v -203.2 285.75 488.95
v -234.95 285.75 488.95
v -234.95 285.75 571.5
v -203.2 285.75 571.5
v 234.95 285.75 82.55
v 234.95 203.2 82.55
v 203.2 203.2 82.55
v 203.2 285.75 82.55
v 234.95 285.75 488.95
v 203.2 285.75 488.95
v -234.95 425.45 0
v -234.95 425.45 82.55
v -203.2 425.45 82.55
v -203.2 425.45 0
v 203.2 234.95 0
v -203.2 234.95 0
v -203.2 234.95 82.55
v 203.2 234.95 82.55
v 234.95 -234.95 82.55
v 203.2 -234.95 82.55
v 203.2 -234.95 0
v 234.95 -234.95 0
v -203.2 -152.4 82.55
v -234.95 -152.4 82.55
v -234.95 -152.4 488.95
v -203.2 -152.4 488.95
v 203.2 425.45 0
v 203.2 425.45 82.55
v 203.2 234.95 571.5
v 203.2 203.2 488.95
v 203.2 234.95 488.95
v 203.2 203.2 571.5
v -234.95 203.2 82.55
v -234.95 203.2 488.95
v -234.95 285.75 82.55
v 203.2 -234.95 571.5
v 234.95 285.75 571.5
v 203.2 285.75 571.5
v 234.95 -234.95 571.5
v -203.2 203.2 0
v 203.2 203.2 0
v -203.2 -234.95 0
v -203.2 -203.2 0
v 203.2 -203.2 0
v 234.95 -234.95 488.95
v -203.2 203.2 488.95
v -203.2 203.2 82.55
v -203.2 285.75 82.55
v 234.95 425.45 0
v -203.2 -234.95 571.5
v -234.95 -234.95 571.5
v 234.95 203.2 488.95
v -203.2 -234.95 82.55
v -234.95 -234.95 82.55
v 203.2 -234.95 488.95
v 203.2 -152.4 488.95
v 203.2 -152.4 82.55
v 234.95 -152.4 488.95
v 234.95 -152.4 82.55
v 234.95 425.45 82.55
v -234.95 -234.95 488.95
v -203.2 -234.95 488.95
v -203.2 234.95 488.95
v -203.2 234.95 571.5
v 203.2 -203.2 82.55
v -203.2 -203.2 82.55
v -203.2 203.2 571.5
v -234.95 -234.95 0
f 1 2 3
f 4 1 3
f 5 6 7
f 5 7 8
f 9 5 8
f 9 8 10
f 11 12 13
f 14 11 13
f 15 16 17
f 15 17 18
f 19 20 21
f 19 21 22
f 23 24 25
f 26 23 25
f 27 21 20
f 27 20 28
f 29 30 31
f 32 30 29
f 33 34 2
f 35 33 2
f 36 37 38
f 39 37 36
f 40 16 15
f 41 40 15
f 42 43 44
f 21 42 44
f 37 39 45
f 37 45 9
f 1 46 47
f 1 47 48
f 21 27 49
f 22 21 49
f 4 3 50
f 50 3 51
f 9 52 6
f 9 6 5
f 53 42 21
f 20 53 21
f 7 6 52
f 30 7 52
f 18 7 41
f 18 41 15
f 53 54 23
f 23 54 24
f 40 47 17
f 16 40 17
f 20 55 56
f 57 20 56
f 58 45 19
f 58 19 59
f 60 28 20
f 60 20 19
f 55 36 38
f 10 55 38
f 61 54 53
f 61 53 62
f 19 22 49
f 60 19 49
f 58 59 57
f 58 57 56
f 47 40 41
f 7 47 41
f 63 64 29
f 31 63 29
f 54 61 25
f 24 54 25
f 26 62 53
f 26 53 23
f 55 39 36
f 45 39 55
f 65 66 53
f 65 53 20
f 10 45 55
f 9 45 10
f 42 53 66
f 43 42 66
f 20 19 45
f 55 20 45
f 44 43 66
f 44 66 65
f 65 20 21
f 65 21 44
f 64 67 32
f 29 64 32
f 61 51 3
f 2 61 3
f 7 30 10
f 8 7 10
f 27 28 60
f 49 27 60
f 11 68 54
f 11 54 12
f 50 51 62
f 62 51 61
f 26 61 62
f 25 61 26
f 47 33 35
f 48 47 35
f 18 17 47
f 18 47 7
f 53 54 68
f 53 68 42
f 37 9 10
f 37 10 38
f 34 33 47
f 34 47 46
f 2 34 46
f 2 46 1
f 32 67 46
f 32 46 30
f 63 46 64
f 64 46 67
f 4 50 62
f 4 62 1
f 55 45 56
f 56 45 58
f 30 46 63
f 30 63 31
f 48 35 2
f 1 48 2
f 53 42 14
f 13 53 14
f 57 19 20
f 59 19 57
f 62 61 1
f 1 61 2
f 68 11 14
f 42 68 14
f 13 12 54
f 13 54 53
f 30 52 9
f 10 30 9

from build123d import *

# Parameters (mm, degrees)
F0_W      = 406.4
F0_H      = 31.75
F1_DEPTH  = 82.55
F2_W      = 31.75
F2_H      = 660.4
F3_DEPTH  = 82.55
F4_W      = 82.55
F4_H      = 406.4
F5_DEPTH  = 31.75
F7_DEPTH  = 31.75
F9_W      = 406.4
F9_H      = 82.55
F10_DEPTH = 31.75


with BuildPart() as f1:
    # F0 (on Top) → F1 (new body)
    with BuildSketch(Plane.XY):
        with Locations((0, 219.075)):
            Rectangle(F0_W, F0_H)
        with Locations((0, -219.075)):
            Rectangle(F0_W, F0_H)
    extrude(amount=F1_DEPTH)


with BuildPart() as f3:
    # F2 (on Top) → F3 (new body)
    with BuildSketch(Plane.XY):
        with Locations((-219.075, 95.25)):
            Rectangle(F2_W, F2_H)
        with Locations((219.075, 95.25)):
            Rectangle(F2_W, F2_H)
    extrude(amount=F3_DEPTH)


with BuildPart() as f5:
    # F4 (on face) → F5 (new body)
    with BuildSketch(Plane.YZ.offset(234.95)):
        with Locations((-193.675, 285.75)):
            Rectangle(F4_W, F4_H)
        with Locations((244.475, 285.75)):
            Rectangle(F4_W, F4_H)
    extrude(amount=-F5_DEPTH)


with BuildPart() as f7:
    # F6 (on face) → F7 (new body)
    with BuildSketch(Plane.YZ.offset(234.95)):
        Polygon((-234.95, 571.5), (-234.95, 488.95), (-152.4, 488.95), (285.75, 488.95), (285.75, 571.5), align=None)
    extrude(amount=-F7_DEPTH)


with BuildPart() as f8_1:
    # F8: instance of F5
    add(f5.part.mirror(Plane.YZ))


with BuildPart() as f8_2:
    # F8: instance of F7
    add(f7.part.mirror(Plane.YZ))


with BuildPart() as f10:
    # F9 (on face) → F10 (new body)
    with BuildSketch(Plane.XZ.offset(-203.2)):
        with Locations((0, 530.225)):
            Rectangle(F9_W, F9_H)
    extrude(amount=-F10_DEPTH)


solid = Compound([f1.part, f3.part, f5.part, f7.part, f8_1.part, f8_2.part, f10.part])
